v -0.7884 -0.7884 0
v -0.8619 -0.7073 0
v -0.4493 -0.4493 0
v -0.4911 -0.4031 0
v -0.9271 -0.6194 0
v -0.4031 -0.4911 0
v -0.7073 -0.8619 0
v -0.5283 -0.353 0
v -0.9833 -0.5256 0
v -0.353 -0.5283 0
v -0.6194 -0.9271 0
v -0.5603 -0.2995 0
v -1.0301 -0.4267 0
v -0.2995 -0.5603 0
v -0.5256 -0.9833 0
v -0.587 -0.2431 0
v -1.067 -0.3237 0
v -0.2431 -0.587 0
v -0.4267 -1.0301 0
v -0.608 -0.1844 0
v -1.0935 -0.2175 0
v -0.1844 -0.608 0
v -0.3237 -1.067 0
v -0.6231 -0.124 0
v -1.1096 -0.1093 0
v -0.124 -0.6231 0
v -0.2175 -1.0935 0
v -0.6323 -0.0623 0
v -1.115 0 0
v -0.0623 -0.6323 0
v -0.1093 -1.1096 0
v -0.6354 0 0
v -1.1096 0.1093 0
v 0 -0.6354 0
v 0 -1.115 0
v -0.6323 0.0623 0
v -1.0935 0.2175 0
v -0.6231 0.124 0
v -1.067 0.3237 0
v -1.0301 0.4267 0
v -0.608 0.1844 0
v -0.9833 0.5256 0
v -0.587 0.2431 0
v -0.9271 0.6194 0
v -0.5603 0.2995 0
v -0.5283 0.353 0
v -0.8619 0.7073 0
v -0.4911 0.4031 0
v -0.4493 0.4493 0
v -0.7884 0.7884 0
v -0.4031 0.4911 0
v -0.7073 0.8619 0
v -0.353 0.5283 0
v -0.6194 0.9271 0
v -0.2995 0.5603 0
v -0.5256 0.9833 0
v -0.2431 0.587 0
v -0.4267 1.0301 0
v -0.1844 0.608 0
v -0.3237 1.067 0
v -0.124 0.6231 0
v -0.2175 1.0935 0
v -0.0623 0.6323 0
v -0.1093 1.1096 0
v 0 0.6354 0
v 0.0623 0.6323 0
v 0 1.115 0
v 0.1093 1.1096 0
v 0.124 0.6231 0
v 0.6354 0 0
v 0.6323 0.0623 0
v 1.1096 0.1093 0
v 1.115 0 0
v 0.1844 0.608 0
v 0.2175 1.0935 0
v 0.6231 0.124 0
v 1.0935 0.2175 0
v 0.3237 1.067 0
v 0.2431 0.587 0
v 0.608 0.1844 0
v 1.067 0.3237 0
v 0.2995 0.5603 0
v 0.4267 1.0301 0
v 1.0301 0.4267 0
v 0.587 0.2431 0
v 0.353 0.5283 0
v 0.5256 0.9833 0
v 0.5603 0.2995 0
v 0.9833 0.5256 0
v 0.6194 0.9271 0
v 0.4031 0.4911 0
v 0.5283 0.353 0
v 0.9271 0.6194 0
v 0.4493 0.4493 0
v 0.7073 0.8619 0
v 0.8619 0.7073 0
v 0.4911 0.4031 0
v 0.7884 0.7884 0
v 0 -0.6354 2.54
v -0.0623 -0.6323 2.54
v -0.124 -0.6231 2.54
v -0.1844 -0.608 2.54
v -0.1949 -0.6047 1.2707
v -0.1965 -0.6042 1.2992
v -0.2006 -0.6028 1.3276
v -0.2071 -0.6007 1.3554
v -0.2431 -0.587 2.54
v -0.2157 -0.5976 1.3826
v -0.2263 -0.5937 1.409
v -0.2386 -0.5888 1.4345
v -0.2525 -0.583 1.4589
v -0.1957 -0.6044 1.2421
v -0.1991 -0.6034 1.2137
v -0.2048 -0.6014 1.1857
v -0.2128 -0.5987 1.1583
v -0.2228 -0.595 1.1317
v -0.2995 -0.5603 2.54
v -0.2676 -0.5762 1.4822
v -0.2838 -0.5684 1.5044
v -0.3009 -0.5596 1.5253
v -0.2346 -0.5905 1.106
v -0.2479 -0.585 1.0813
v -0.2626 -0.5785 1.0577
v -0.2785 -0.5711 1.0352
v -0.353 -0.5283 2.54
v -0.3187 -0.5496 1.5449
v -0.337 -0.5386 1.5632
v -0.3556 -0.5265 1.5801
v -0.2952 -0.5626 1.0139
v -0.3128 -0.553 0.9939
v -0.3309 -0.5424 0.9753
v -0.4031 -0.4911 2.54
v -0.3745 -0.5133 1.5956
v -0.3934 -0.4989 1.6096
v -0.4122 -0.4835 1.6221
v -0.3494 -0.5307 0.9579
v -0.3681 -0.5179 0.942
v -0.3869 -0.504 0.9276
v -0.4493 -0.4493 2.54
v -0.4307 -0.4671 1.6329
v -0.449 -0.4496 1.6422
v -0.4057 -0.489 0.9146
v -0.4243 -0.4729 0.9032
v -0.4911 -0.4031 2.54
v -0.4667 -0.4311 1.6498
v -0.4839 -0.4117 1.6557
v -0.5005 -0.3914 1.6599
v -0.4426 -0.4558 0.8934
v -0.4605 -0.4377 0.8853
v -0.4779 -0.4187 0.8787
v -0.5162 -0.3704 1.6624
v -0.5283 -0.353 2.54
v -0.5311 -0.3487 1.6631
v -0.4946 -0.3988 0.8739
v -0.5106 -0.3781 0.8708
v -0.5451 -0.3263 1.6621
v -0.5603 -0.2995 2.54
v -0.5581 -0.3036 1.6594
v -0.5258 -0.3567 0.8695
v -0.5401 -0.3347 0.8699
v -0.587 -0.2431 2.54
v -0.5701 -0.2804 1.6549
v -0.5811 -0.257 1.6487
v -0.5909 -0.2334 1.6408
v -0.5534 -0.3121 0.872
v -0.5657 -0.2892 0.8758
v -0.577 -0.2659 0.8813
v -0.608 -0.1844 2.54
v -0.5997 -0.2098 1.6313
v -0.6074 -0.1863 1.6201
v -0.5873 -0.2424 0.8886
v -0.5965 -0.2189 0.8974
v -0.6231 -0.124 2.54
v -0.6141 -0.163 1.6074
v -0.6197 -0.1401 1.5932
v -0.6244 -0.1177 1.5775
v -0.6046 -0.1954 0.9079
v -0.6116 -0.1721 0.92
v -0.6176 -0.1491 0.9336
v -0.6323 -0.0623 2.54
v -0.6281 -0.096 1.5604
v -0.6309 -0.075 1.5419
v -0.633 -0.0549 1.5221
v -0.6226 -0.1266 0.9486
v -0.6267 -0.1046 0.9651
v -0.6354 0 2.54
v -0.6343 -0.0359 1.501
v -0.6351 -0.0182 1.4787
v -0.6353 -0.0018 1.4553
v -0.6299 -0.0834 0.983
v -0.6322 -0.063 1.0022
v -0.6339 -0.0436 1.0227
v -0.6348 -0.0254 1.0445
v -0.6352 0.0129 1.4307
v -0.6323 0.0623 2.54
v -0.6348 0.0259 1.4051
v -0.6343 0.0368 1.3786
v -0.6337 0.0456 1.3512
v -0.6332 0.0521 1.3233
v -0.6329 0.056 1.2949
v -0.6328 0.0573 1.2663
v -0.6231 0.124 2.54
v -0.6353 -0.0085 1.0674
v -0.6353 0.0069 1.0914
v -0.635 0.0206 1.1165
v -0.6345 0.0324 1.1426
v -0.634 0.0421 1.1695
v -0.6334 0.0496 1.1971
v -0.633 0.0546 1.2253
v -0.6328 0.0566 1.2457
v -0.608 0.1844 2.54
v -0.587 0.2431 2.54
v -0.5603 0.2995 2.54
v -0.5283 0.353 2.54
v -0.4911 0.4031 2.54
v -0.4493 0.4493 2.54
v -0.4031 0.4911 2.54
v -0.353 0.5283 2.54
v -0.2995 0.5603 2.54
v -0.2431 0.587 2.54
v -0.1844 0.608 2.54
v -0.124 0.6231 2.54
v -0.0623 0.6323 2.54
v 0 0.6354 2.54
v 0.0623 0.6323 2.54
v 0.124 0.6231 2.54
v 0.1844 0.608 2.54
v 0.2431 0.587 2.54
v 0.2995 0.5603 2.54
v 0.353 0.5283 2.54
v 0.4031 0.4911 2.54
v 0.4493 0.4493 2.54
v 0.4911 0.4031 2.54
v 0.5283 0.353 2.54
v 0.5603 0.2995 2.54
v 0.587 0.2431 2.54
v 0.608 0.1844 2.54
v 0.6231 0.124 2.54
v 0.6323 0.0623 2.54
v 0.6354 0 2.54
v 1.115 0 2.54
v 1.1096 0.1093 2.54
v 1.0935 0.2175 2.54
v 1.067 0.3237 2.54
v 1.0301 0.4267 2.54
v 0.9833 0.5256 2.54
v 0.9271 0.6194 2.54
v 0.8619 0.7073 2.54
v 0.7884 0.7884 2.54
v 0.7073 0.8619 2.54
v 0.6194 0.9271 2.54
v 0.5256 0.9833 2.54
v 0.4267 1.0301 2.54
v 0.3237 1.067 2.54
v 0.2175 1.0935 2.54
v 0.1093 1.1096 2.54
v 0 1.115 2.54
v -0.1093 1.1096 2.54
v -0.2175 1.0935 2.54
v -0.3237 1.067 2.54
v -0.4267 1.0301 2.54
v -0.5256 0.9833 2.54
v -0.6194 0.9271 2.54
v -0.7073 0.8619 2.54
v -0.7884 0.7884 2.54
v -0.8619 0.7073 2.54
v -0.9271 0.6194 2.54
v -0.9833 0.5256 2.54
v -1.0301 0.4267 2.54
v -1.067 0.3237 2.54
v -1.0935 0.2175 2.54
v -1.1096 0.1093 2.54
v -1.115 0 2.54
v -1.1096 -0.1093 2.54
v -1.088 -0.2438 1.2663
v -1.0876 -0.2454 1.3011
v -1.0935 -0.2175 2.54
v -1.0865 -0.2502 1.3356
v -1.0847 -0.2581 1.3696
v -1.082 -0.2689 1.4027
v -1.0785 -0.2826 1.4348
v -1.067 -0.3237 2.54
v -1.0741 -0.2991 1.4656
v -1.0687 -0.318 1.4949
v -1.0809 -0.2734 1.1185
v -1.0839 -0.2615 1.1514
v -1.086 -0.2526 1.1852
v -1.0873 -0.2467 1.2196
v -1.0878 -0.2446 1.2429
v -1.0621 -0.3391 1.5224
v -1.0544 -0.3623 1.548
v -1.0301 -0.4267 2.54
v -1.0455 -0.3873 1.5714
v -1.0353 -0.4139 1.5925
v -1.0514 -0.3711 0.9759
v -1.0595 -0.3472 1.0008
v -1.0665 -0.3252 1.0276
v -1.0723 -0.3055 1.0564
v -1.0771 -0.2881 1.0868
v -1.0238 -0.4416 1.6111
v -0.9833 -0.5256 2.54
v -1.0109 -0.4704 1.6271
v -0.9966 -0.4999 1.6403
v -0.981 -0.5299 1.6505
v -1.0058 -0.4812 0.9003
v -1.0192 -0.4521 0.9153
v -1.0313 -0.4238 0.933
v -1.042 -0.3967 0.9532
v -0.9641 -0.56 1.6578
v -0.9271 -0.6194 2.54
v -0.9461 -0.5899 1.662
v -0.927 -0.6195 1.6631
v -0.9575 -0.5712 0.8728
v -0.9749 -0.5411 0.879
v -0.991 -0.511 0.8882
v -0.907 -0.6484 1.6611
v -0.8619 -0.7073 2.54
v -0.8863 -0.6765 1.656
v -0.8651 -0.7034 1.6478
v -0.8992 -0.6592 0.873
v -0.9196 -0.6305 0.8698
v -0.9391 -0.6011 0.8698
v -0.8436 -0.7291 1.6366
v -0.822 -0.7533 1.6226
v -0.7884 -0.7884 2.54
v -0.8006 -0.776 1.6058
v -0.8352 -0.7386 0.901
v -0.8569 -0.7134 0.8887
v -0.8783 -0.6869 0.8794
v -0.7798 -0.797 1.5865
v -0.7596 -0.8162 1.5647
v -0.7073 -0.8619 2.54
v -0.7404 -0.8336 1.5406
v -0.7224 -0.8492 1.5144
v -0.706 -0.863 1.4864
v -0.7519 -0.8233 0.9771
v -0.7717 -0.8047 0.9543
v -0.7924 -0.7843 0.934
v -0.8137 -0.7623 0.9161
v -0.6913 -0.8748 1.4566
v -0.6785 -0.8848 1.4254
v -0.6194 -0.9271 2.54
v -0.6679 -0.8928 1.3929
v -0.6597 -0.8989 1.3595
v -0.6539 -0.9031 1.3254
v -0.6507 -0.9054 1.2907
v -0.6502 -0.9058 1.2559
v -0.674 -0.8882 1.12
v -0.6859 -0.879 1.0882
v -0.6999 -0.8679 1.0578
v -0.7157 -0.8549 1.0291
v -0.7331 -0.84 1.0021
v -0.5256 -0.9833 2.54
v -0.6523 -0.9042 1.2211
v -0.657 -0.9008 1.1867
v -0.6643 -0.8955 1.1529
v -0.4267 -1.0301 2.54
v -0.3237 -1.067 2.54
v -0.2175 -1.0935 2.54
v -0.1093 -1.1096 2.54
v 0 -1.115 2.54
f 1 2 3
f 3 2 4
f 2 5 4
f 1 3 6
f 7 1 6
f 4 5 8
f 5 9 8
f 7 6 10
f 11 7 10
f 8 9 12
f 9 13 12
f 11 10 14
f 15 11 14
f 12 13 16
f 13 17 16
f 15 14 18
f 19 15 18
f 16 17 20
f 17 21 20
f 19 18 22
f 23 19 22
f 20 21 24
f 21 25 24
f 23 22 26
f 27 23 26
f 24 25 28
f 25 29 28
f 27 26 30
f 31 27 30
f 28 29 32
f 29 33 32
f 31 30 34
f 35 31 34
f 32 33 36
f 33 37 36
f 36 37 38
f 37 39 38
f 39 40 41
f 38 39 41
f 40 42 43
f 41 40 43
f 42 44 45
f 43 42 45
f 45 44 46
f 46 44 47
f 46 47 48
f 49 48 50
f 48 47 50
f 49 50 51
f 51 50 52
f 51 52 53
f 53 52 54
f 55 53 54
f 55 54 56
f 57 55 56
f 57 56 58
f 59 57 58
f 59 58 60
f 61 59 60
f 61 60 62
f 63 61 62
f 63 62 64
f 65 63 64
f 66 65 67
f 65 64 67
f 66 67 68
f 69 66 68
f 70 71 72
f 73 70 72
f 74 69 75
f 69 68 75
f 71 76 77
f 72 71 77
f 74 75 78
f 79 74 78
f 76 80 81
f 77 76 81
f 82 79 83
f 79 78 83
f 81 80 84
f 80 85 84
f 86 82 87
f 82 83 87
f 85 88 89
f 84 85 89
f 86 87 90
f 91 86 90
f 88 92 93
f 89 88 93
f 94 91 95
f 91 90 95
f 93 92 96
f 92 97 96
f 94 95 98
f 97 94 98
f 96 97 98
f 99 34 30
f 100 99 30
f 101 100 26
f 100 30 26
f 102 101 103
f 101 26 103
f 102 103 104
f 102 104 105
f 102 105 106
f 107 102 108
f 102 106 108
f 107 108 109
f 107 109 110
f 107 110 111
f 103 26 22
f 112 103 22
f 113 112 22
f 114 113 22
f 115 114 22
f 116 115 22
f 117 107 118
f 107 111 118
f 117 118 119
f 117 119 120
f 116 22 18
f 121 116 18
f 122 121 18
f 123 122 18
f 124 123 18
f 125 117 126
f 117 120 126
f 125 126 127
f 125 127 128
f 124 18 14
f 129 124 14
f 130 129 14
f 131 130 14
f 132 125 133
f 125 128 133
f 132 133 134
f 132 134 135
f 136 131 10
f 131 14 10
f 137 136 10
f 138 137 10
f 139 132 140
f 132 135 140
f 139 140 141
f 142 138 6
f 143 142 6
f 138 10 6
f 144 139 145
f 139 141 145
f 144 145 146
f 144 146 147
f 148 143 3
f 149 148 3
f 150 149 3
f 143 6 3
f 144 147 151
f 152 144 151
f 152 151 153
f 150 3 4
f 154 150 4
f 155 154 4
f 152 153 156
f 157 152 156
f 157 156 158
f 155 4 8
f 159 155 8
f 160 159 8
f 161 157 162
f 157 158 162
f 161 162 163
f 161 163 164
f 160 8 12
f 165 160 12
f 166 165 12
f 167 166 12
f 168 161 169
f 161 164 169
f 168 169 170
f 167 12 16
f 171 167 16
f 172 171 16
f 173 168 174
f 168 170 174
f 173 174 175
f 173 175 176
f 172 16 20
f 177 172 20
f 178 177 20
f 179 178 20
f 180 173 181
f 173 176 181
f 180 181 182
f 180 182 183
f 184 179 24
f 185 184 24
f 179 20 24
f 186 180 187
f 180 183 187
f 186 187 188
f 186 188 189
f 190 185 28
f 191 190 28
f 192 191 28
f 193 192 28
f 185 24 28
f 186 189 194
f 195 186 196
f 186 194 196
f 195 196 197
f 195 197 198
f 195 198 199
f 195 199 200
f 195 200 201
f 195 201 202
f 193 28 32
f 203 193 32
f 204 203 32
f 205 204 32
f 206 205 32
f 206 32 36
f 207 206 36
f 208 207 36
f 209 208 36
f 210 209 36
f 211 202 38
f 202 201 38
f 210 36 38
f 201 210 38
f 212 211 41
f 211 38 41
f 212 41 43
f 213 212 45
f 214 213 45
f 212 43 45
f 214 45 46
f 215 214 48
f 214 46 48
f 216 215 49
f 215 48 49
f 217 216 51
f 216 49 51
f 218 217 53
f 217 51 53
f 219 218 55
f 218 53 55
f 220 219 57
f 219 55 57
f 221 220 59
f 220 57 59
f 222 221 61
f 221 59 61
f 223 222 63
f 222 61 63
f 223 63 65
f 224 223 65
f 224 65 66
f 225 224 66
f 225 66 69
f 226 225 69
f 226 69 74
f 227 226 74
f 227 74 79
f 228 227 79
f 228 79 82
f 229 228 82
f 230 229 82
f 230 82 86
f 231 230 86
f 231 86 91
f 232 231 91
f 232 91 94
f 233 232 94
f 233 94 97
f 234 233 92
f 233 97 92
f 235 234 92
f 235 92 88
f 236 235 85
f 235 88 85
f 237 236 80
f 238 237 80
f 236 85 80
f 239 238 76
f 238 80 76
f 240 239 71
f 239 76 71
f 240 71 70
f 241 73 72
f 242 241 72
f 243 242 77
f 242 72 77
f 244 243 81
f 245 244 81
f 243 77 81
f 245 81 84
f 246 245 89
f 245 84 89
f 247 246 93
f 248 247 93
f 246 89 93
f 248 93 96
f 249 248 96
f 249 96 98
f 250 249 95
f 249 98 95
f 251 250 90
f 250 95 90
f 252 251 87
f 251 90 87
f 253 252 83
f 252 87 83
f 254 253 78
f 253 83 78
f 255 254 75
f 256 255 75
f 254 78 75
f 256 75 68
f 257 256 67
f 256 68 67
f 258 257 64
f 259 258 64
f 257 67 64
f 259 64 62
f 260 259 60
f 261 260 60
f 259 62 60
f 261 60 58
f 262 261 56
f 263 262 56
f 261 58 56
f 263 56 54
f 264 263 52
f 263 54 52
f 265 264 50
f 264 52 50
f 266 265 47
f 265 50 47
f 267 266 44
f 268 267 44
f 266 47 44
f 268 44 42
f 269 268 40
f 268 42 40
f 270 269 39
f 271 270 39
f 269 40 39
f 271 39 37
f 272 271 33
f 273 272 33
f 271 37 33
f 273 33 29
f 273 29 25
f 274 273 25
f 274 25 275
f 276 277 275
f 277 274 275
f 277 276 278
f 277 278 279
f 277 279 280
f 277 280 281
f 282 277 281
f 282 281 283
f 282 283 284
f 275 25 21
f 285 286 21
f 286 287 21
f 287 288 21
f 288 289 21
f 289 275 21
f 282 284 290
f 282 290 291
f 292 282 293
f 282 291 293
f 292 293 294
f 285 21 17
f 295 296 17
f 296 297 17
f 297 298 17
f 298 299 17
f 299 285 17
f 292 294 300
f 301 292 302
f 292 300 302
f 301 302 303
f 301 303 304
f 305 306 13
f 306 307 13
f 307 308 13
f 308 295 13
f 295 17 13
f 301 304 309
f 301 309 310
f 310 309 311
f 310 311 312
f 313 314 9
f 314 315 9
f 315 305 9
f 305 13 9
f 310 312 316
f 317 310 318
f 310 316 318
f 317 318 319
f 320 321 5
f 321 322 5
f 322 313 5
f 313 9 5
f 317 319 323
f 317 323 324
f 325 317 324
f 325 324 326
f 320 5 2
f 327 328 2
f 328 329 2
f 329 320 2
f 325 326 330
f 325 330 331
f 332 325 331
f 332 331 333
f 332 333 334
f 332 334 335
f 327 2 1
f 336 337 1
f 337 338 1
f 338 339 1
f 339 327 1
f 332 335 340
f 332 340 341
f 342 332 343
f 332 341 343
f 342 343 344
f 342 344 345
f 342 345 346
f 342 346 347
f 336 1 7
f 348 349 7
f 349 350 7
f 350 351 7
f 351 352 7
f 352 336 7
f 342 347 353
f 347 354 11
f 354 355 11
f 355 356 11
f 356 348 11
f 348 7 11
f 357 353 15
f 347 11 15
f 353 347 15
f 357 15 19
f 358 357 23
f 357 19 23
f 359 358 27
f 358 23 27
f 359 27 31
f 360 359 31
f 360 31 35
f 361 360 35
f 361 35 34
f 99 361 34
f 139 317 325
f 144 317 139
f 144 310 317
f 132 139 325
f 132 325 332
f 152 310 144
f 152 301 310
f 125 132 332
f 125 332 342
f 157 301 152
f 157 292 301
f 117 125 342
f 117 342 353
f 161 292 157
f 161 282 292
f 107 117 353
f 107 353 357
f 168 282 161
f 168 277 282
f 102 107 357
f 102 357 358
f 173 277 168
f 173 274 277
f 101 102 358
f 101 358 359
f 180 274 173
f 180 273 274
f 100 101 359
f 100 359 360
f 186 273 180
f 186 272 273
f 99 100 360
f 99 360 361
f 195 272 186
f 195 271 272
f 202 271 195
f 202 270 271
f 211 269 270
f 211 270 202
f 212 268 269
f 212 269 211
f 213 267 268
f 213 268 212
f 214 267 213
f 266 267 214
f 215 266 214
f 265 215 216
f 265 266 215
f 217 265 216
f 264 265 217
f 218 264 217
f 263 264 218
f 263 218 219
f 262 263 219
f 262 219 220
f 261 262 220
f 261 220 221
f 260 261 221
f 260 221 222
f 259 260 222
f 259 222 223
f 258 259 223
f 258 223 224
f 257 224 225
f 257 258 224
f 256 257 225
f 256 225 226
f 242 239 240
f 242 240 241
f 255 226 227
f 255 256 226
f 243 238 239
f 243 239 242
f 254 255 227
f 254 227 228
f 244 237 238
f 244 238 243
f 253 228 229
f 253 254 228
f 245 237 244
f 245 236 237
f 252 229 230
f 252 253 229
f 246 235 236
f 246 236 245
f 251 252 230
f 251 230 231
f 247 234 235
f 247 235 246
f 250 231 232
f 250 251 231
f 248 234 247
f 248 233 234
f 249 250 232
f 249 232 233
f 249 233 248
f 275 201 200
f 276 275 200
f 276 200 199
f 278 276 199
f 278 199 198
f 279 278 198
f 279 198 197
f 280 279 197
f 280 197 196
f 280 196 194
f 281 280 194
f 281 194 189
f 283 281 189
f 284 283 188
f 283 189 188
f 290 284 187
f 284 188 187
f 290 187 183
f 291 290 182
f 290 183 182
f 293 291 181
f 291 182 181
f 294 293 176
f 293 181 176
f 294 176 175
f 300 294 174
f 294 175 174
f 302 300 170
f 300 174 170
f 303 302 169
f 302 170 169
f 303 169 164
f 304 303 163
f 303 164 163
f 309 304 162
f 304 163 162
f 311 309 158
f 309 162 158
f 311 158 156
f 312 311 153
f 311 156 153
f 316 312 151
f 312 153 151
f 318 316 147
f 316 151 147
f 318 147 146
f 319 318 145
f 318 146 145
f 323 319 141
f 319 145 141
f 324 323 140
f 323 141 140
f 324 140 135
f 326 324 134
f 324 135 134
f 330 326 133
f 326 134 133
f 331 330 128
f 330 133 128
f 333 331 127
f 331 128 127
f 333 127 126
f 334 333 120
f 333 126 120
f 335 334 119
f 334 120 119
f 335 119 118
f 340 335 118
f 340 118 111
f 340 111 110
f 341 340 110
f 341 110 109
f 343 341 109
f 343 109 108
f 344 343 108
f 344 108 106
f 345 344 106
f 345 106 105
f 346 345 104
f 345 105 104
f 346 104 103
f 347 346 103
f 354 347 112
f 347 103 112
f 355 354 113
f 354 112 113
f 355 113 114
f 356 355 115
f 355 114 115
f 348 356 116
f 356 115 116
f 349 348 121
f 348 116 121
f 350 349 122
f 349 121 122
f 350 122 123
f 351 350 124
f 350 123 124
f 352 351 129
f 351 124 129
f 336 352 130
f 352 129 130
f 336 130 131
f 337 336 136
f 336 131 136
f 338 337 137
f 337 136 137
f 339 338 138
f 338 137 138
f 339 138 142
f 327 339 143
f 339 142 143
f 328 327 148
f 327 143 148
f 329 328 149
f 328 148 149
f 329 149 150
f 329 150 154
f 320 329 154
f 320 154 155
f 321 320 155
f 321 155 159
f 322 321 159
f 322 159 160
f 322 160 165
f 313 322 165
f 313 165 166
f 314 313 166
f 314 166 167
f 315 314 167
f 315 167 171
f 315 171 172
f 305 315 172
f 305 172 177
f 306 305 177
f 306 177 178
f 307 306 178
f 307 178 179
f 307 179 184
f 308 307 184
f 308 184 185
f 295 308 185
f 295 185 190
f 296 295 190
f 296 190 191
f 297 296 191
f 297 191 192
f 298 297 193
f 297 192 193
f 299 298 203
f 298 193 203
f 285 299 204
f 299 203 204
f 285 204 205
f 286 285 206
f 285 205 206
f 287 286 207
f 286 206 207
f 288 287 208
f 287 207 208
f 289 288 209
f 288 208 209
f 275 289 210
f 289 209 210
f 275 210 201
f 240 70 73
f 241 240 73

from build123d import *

# Parameters (mm, degrees)
BOSS_EXTRUDE1_DEPTH                 = 2.54
F_1_32_0_03125_DIAMETER_HOLE1_D     = 0.79375
F_1_32_0_03125_DIAMETER_HOLE1_DEPTH = 1.27
F_1_32_0_03125_DIAMETER_HOLE1_TIP   = 0.333017666


with BuildPart() as part:
    # Sketch1 → Boss-Extrude1 (new body)
    with BuildSketch(Plane.XY):
        with BuildLine():
            Line((0, -1.114963074), (0, -0.635351917))
            ThreePointArc((0, -0.635351917), (-0.449261649, 0.449261649), (0.635351917, 0))
            Line((0.635351917, 0), (1.114963074, 0))
            ThreePointArc((1.114963074, 0), (-0.78839795, 0.78839795), (0, -1.114963074))
        make_face()
    extrude(amount=BOSS_EXTRUDE1_DEPTH)

    # 1/32 (0.03125) Diameter Hole1
    with Locations(Plane(origin=(-0.929920595, -0.615134411, 1.266279726), x_dir=(0.551708325444, -0.834037123656, 0), z_dir=(-0.834037123656, -0.551708325444, 0))):
        with Locations((-1e-09, 0)):
            Hole(F_1_32_0_03125_DIAMETER_HOLE1_D / 2, depth=F_1_32_0_03125_DIAMETER_HOLE1_DEPTH)
            with Locations((0, 0, -(F_1_32_0_03125_DIAMETER_HOLE1_DEPTH + F_1_32_0_03125_DIAMETER_HOLE1_TIP / 2))):  # 100° drill point
                Cone(0, F_1_32_0_03125_DIAMETER_HOLE1_D / 2, F_1_32_0_03125_DIAMETER_HOLE1_TIP, mode=Mode.SUBTRACT)


solid = part.part
